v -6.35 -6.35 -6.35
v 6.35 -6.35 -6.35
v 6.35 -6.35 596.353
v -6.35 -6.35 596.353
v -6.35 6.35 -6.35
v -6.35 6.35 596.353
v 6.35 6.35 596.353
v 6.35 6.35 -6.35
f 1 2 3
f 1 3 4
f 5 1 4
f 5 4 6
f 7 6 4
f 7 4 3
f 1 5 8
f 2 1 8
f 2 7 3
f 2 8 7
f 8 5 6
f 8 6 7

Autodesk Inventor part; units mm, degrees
ref_plane "Start plane" through (0, 0, -6.35) normal (0, 0, 1) x (1, 0, 0)
ref_plane "End plane" through (0, 0, 596.3529) normal (0, 0, 1) x (1, 0, 0)
sketch "Sketch" plane through (0, 0, 0) normal (0, 0, 1) x (1, 0, 0)
  line L0 (6.35, -6.35) -> (-6.35, -6.35)
  line L1 (-6.35, -6.35) -> (-6.35, 6.35)
  line L2 (-6.35, 6.35) -> (6.35, 6.35)
  line L3 (6.35, 6.35) -> (6.35, -6.35)
  line L4 (-6, 0) -> (8, 0) construction
  line L5 (0, -30) -> (0, 40) construction
  line L6 (0, 54) -> (0, -44) construction
  line L7 (-9.62, 0) -> (13.27, 0) construction
  dimension "d0" = 12.7
  dimension "d1" = 12.7
  dimension "d4" = 6.35
  dimension "d5" = 6.35
extrude "Body" add sketch "Sketch" along normal up to surface (602.7029 mm away) from surface at -6.35
sketch "Sketch3" plane through (0, 0, 0) normal (0, 0, 1) x (1, 0, 0)
  line L0 (0, 0) -> (10, 0)
ref_plane "Work Plane3" through (0, 0, 0) normal (0, -1, 0) x (1, 0, 0)
sketch "Sketch4" plane through (0, 0, 0) normal (0, -1, 0) x (1, 0, 0)
  line L0 (-2, -6.35) -> (12, -6.35)
  line L1 (-2, 596.3529) -> (12, 596.3529)
  dimension "d9" = 602.7029
ref_plane "Work Plane6" through (-203.2, 0, -6.35) normal (0, 0, -1) x (-1, 0, 0)
split "Split3" plane through (-203.2, 0, -6.35) removes the side toward (0, 0, -1)
ref_plane "Work Plane7" through (-196.85, 0, 596.3529) normal (0, 0, 1) x (1, 0, 0)
split "Split4" plane through (-196.85, 0, 596.3529) removes the side toward (0, 0, 1)
ref_plane "Work Plane8" through (0, 0, 596.3529) normal (0, 0, 1) x (1, 0, 0)
split "Split5" plane through (0, 0, 596.3529) removes the side toward (0, 0, 1)
equation "\"d0\" = G_W"
equation "\"d1\" = G_H"
equation "\"d4\" = 0.5 * d1"
equation "\"d5\" = 0.5 * d0"
equation "\"d2\" = G_L"
equation "\"G_W\" = 12.7"
equation "\"G_H\" = 12.7"
equation "\"G_L\" = d9"
equation "\"G_OFFSET_START\" = 6.35"
equation "\"G_OFFSET_END\" = 6.35"
equation "\"d6\" = -G_OFFSET_START"
equation "\"d7\" = G_OFFSET_END + B_L"
equation "\"B_L\" = 590.00286"
properties part number "AISC - 1/2x1/2 - 23.728" material "Steel, Alloy"
